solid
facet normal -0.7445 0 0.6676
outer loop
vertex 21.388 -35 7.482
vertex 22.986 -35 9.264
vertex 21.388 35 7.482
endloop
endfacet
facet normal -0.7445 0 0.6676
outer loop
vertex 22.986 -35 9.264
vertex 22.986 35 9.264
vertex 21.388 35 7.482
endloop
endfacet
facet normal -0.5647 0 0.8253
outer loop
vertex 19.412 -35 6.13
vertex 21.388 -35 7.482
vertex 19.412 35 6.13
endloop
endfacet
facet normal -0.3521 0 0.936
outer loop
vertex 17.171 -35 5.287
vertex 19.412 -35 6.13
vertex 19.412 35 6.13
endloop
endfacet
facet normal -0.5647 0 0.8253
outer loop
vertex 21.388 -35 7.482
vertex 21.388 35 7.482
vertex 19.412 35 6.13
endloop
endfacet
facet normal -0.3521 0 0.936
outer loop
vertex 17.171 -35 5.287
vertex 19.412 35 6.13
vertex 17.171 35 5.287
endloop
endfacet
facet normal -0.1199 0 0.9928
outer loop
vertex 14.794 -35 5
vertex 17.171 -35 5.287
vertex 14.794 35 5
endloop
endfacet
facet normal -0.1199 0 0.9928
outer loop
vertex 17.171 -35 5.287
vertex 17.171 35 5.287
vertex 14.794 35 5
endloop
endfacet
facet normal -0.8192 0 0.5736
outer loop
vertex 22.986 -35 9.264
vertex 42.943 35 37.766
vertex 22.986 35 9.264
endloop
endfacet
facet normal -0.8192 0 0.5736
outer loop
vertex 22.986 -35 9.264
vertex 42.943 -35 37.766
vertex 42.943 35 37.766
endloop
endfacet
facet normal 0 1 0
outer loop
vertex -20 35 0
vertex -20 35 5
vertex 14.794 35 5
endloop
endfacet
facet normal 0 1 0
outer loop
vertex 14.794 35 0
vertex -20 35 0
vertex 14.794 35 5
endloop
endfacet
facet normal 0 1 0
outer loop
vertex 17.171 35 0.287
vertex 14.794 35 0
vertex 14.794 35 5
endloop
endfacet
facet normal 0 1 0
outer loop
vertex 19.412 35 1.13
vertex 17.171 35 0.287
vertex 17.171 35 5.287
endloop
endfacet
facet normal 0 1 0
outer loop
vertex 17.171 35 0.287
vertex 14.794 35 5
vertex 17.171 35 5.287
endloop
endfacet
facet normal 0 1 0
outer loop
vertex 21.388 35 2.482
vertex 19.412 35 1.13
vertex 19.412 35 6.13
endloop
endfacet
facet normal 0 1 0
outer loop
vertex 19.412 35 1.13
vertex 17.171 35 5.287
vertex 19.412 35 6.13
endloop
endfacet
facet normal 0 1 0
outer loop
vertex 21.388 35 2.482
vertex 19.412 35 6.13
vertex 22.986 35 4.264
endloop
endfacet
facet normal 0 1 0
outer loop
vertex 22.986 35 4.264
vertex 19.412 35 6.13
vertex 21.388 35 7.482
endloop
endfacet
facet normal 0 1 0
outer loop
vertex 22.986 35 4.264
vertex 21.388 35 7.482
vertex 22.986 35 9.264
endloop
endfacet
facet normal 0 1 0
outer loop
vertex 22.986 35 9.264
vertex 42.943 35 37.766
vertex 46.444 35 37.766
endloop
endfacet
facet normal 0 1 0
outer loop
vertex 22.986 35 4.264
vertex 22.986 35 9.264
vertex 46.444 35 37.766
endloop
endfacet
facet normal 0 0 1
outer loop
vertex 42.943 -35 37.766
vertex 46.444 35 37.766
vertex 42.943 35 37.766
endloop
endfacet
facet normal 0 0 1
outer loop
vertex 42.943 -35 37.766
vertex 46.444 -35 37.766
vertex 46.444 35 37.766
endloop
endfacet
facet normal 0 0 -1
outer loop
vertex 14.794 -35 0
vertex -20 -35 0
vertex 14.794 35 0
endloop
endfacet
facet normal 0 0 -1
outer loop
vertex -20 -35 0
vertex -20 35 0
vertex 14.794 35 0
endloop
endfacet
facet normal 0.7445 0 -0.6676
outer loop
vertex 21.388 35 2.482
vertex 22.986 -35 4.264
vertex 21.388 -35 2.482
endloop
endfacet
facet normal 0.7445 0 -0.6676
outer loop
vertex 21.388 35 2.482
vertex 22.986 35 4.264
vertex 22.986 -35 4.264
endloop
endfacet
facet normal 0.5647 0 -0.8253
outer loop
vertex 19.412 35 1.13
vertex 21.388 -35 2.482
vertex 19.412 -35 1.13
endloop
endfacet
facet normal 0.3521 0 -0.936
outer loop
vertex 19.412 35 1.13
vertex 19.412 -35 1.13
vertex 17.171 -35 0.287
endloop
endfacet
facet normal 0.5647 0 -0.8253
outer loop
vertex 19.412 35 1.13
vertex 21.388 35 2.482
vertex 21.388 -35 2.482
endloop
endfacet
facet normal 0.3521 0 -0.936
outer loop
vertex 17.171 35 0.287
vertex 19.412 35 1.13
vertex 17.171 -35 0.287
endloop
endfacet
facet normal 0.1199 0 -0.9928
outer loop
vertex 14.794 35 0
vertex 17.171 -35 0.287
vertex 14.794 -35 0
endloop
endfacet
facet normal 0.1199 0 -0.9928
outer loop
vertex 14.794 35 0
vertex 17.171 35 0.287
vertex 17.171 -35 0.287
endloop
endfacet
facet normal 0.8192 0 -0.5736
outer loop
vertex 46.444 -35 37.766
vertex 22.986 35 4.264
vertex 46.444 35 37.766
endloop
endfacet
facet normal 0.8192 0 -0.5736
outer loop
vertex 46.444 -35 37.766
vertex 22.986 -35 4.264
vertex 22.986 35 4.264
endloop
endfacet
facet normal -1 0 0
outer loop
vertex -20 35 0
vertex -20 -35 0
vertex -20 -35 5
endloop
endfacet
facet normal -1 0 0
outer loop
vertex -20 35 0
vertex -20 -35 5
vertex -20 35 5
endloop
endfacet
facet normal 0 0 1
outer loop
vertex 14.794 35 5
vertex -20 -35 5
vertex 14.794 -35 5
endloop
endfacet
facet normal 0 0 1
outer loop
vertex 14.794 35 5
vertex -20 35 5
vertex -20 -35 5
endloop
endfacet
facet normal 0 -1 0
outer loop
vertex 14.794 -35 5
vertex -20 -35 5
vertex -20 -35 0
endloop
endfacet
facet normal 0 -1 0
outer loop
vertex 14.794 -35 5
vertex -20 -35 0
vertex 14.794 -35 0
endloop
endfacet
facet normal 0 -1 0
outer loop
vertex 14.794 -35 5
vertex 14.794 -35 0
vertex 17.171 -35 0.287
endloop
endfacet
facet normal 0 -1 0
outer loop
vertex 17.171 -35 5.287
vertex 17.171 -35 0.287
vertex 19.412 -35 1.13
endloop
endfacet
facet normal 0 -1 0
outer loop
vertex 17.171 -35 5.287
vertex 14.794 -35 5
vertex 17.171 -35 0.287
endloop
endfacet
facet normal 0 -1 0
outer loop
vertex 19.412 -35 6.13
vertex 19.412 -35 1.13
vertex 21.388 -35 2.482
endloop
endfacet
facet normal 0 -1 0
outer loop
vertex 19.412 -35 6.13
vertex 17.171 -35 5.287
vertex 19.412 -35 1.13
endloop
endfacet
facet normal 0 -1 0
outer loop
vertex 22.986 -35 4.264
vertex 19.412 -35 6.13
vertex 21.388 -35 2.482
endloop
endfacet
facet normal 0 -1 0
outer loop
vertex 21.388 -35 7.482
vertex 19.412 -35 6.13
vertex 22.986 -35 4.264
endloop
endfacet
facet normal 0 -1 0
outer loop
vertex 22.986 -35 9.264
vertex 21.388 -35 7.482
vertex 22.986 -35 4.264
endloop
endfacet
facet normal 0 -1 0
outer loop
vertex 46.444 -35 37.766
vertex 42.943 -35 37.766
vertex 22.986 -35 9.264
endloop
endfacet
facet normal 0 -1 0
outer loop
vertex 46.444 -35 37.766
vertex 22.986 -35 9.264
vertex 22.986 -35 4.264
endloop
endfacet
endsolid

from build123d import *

# Parameters (mm, degrees)
F0_W     = 40
F0_H     = 70
F1_DEPTH = 5
F3_DEPTH = 35
F4_R     = 10


with BuildPart() as f1:
    # F0 (on Top) → F1 (new body)
    with BuildSketch(Plane.XY):
        Rectangle(F0_W, F0_H)
    extrude(amount=F1_DEPTH)

    # F2 (on Front) → F3 (join, symmetric)
    with BuildSketch(Plane.XZ):
        Polygon((42.943057, 37.766082), (20, 5), (20, 0), (46.444095, 37.766082), align=None)
    extrude(amount=F3_DEPTH, both=True)

    # F4
    f4_edges = [f1.edges().sort_by_distance(p)[0] for p in [
        (20, 0, 5),
        (20, 0, 0),
    ]]
    fillet(f4_edges, radius=F4_R)


solid = f1.part
